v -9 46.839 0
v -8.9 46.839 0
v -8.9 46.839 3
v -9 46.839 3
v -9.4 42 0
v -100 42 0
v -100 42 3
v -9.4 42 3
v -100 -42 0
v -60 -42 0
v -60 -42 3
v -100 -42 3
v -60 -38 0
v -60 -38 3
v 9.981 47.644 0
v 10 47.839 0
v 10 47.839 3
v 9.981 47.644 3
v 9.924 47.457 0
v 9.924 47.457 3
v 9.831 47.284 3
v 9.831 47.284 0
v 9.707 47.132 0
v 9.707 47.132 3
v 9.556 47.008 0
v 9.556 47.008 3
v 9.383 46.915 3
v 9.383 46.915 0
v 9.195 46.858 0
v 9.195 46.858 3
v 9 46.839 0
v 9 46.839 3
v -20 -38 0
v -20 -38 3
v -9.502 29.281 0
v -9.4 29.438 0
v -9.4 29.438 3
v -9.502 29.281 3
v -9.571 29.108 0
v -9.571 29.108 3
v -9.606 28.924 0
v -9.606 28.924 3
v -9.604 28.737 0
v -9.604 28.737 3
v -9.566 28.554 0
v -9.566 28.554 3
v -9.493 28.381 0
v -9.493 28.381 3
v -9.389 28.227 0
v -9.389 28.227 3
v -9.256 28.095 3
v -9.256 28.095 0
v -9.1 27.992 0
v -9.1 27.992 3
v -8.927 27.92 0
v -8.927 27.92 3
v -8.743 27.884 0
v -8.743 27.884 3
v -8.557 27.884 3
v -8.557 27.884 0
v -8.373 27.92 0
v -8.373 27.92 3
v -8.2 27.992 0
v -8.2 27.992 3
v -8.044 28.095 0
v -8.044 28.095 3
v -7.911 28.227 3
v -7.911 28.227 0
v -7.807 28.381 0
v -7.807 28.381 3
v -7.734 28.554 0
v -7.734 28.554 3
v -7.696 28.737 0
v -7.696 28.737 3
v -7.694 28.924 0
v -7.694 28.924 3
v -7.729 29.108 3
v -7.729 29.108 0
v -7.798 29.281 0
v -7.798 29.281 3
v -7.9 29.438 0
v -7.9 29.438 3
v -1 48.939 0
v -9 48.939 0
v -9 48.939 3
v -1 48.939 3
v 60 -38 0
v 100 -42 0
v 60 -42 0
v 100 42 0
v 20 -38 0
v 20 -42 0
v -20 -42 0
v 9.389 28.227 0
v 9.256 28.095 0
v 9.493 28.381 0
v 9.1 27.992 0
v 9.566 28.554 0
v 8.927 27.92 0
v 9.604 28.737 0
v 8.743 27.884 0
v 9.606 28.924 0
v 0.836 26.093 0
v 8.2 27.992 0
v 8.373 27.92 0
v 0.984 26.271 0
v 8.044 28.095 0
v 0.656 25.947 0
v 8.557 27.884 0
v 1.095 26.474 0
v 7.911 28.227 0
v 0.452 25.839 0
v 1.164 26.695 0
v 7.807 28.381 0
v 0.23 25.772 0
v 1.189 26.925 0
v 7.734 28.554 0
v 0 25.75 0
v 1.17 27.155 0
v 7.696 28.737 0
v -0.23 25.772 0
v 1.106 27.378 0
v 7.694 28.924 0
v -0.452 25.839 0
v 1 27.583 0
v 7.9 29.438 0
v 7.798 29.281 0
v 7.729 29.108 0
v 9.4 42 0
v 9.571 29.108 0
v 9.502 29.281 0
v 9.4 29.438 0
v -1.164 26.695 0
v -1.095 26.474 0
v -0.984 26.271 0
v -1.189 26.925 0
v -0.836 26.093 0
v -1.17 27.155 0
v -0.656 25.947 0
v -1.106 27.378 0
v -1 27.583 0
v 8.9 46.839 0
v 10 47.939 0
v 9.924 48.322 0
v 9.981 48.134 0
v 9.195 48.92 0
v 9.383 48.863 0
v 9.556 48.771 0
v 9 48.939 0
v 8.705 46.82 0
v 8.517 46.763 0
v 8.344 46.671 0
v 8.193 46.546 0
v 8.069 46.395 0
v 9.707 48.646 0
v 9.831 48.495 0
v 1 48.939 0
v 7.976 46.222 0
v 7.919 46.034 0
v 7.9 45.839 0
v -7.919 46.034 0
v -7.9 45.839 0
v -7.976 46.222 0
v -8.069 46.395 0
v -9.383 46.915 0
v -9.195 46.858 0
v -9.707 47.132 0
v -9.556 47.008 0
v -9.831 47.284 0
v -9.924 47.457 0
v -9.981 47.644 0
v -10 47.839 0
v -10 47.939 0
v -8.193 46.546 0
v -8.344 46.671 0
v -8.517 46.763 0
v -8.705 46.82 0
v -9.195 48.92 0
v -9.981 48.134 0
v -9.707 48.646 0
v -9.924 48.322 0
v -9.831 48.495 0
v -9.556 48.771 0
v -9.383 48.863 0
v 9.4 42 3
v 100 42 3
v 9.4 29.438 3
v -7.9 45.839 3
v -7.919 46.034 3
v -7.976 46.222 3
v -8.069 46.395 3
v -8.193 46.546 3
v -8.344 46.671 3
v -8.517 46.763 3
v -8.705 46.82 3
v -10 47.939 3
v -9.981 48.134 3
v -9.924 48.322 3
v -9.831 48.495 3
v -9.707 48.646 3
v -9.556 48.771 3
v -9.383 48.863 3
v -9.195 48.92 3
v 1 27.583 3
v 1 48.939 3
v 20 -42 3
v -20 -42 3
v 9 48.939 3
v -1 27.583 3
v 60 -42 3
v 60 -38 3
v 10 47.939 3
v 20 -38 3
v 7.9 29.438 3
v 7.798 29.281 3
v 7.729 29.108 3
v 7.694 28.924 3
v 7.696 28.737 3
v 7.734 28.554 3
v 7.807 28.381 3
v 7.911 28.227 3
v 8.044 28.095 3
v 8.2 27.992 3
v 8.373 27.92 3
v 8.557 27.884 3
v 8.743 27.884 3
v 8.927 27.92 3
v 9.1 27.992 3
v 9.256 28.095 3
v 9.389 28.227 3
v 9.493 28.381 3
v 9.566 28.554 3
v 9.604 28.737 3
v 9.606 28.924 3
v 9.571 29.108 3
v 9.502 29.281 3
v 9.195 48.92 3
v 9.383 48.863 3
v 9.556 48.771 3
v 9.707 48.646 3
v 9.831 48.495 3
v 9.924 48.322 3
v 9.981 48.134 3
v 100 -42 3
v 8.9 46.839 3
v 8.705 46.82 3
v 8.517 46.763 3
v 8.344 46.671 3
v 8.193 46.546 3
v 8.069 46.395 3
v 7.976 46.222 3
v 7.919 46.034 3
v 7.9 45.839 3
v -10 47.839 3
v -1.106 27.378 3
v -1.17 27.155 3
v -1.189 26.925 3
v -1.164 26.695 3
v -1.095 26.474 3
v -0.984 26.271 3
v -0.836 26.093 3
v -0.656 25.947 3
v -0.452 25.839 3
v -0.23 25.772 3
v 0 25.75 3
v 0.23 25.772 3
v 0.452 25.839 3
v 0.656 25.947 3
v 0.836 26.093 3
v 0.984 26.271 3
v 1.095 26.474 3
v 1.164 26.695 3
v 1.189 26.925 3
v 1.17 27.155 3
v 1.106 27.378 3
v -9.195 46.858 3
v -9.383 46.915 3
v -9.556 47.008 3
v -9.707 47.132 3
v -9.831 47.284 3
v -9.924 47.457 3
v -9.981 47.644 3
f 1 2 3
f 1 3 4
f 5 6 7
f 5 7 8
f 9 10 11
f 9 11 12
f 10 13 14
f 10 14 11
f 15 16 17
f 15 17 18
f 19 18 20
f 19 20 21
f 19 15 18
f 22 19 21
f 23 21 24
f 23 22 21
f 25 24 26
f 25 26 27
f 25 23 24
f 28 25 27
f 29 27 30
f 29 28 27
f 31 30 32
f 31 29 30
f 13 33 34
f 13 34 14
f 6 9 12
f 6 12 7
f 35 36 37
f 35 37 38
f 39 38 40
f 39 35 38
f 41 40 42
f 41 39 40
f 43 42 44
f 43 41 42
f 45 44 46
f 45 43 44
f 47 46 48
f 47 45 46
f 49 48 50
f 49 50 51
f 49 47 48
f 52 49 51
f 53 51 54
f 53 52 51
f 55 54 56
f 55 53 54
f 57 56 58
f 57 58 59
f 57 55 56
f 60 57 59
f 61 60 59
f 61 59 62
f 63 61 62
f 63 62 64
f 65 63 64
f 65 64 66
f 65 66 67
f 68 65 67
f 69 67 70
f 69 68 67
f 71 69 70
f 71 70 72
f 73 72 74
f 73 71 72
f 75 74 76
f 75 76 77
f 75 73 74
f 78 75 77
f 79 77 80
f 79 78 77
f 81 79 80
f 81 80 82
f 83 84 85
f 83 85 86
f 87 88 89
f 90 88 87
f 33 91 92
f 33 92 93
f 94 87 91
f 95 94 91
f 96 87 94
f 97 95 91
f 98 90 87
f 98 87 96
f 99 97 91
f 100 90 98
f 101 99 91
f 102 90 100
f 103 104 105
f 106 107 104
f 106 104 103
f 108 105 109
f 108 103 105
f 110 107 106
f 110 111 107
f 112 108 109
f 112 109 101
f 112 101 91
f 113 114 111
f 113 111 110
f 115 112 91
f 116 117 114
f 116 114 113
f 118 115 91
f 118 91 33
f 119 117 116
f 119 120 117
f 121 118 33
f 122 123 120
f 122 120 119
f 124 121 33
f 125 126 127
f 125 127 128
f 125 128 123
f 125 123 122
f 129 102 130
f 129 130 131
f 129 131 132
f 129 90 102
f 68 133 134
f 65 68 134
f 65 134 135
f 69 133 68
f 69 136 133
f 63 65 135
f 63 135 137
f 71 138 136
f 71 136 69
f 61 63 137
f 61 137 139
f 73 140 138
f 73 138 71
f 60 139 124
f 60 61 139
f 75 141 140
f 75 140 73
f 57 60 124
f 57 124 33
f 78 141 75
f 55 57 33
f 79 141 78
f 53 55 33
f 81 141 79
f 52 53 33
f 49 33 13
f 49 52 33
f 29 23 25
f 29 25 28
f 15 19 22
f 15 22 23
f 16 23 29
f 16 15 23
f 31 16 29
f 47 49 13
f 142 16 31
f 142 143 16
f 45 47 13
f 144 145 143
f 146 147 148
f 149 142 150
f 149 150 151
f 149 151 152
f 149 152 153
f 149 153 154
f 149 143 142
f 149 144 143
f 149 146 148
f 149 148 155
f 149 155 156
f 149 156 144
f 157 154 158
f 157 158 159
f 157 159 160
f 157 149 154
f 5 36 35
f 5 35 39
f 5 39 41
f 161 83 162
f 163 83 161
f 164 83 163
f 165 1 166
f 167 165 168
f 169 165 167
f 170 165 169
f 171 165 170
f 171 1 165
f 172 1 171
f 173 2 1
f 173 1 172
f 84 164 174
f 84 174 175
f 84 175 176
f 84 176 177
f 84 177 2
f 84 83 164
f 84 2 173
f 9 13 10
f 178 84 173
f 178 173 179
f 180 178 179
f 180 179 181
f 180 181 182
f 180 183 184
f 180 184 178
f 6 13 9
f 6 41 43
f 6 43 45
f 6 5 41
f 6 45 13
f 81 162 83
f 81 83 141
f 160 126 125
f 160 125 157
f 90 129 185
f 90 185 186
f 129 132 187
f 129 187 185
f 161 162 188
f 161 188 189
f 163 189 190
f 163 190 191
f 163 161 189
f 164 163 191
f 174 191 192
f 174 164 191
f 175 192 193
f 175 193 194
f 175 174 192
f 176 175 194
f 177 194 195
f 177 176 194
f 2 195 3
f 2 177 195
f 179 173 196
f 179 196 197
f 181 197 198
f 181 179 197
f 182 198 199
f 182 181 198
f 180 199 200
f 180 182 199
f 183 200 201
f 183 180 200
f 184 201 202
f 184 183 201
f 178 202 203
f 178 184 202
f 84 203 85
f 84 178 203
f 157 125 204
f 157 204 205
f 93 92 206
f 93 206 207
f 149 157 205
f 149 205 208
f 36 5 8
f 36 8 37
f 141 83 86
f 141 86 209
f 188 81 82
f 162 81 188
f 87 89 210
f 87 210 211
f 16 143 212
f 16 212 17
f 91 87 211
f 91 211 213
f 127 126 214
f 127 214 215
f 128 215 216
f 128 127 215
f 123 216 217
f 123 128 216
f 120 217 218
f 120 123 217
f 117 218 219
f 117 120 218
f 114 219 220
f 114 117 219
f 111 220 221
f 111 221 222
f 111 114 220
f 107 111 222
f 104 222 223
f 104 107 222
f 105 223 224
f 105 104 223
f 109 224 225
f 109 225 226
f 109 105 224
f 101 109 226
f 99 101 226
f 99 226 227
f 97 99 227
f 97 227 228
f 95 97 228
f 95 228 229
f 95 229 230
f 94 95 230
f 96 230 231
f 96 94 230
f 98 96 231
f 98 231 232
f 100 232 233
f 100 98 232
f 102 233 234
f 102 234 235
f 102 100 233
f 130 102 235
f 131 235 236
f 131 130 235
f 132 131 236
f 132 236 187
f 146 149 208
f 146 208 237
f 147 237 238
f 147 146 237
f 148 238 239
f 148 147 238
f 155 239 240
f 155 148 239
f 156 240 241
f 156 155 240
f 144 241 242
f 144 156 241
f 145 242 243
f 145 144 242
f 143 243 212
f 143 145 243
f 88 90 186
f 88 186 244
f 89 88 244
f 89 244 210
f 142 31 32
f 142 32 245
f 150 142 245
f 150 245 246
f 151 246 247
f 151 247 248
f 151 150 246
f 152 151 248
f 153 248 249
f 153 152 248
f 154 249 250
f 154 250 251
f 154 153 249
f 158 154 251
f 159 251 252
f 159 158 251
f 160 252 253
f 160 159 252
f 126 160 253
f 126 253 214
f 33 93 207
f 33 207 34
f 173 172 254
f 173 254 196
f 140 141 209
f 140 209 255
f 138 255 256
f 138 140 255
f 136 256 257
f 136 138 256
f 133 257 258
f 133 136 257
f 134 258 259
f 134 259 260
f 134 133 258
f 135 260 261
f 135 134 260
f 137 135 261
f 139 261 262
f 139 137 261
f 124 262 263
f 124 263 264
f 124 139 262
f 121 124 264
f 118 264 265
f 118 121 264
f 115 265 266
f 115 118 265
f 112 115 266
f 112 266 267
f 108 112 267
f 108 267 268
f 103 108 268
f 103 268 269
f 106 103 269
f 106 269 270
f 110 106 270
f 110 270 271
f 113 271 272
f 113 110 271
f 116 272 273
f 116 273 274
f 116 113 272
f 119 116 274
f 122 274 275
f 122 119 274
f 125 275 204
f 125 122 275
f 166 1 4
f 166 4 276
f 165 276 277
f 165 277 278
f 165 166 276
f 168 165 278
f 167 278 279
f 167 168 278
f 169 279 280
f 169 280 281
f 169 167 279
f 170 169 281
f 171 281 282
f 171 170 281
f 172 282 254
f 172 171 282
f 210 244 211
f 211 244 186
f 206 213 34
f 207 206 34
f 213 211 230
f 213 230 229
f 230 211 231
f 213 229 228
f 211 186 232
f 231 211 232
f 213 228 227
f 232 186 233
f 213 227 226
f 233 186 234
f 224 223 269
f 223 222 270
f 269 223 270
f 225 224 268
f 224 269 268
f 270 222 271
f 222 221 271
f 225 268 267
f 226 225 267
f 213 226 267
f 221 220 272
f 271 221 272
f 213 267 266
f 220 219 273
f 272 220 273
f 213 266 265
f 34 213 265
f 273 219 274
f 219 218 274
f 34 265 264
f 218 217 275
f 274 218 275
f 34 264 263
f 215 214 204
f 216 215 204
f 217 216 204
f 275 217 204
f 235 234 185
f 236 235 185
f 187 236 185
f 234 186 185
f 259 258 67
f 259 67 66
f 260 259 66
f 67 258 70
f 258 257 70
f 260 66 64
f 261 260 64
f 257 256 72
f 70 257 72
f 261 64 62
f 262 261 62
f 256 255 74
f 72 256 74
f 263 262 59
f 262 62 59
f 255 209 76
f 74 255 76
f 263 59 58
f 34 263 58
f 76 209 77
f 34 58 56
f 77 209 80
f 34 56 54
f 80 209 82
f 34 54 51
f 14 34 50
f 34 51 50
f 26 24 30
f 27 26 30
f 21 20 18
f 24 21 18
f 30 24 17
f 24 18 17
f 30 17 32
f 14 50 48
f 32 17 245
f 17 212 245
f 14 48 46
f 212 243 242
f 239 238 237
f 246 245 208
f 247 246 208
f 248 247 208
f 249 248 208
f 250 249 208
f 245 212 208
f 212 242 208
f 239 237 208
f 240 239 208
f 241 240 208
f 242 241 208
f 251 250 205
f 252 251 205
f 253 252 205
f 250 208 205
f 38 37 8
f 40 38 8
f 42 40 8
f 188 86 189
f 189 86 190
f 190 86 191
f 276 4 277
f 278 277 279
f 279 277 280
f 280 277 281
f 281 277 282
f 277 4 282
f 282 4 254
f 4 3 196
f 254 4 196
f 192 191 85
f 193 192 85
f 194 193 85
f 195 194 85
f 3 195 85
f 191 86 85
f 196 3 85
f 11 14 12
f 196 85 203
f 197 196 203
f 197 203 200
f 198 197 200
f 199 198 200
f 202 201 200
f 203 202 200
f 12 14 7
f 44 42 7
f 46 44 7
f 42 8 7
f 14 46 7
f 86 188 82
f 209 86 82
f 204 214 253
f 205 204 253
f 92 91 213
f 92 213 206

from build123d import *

# Parameters (mm, degrees)
BOSS_EXTRUDE1_DEPTH = 3


with BuildPart() as part:
    # Sketch1 → Boss-Extrude1 (new body)
    with BuildSketch(Plane.XY):
        with BuildLine():
            Line((-20, -42), (-20, -38))
            Line((-20, -38), (-60, -38))
            Line((-60, -38), (-60, -42))
            Line((-60, -42), (-100, -42))
            Line((-100, -42), (-100, 42))
            Line((-100, 42), (-9.4, 42))
            Line((-9.4, 42), (-9.4, 29.437955396))
            ThreePointArc((-9.4, 29.437955396), (-8.65, 27.879616867), (-7.9, 29.437955396))
            Line((-7.9, 29.437955396), (-7.9, 45.839266813))
            ThreePointArc((-7.9, 45.839266813), (-8.192893219, 46.546373594), (-8.9, 46.839266813))
            Line((-8.9, 46.839266813), (-9, 46.839266813))
            ThreePointArc((-9, 46.839266813), (-9.707106781, 47.132160032), (-10, 47.839266813))
            Line((-10, 47.839266813), (-10, 47.939266813))
            ThreePointArc((-10, 47.939266813), (-9.707106781, 48.646373594), (-9, 48.939266813))
            Line((-9, 48.939266813), (-1, 48.939266813))
            Line((-1, 48.939266813), (-1, 27.583372359))
            ThreePointArc((-1, 27.583372359), (0, 25.749782911), (1, 27.583372359))
            Line((1, 27.583372359), (1, 48.939266813))
            Line((1, 48.939266813), (9, 48.939266813))
            ThreePointArc((9, 48.939266813), (9.707106781, 48.646373594), (10, 47.939266813))
            Line((10, 47.939266813), (10, 47.839266813))
            ThreePointArc((10, 47.839266813), (9.707106781, 47.132160032), (9, 46.839266813))
            Line((9, 46.839266813), (8.9, 46.839266813))
            ThreePointArc((8.9, 46.839266813), (8.192893219, 46.546373594), (7.9, 45.839266813))
            Line((7.9, 45.839266813), (7.9, 29.437955396))
            ThreePointArc((7.9, 29.437955396), (8.65, 27.879616867), (9.4, 29.437955396))
            Line((9.4, 29.437955396), (9.4, 42))
            Line((9.4, 42), (100, 42))
            Line((100, 42), (100, -42))
            Line((100, -42), (60, -42))
            Line((60, -42), (60, -38))
            Line((60, -38), (20, -38))
            Line((20, -38), (20, -42))
            Line((20, -42), (-20, -42))
        make_face()
    extrude(amount=BOSS_EXTRUDE1_DEPTH)


solid = part.part
